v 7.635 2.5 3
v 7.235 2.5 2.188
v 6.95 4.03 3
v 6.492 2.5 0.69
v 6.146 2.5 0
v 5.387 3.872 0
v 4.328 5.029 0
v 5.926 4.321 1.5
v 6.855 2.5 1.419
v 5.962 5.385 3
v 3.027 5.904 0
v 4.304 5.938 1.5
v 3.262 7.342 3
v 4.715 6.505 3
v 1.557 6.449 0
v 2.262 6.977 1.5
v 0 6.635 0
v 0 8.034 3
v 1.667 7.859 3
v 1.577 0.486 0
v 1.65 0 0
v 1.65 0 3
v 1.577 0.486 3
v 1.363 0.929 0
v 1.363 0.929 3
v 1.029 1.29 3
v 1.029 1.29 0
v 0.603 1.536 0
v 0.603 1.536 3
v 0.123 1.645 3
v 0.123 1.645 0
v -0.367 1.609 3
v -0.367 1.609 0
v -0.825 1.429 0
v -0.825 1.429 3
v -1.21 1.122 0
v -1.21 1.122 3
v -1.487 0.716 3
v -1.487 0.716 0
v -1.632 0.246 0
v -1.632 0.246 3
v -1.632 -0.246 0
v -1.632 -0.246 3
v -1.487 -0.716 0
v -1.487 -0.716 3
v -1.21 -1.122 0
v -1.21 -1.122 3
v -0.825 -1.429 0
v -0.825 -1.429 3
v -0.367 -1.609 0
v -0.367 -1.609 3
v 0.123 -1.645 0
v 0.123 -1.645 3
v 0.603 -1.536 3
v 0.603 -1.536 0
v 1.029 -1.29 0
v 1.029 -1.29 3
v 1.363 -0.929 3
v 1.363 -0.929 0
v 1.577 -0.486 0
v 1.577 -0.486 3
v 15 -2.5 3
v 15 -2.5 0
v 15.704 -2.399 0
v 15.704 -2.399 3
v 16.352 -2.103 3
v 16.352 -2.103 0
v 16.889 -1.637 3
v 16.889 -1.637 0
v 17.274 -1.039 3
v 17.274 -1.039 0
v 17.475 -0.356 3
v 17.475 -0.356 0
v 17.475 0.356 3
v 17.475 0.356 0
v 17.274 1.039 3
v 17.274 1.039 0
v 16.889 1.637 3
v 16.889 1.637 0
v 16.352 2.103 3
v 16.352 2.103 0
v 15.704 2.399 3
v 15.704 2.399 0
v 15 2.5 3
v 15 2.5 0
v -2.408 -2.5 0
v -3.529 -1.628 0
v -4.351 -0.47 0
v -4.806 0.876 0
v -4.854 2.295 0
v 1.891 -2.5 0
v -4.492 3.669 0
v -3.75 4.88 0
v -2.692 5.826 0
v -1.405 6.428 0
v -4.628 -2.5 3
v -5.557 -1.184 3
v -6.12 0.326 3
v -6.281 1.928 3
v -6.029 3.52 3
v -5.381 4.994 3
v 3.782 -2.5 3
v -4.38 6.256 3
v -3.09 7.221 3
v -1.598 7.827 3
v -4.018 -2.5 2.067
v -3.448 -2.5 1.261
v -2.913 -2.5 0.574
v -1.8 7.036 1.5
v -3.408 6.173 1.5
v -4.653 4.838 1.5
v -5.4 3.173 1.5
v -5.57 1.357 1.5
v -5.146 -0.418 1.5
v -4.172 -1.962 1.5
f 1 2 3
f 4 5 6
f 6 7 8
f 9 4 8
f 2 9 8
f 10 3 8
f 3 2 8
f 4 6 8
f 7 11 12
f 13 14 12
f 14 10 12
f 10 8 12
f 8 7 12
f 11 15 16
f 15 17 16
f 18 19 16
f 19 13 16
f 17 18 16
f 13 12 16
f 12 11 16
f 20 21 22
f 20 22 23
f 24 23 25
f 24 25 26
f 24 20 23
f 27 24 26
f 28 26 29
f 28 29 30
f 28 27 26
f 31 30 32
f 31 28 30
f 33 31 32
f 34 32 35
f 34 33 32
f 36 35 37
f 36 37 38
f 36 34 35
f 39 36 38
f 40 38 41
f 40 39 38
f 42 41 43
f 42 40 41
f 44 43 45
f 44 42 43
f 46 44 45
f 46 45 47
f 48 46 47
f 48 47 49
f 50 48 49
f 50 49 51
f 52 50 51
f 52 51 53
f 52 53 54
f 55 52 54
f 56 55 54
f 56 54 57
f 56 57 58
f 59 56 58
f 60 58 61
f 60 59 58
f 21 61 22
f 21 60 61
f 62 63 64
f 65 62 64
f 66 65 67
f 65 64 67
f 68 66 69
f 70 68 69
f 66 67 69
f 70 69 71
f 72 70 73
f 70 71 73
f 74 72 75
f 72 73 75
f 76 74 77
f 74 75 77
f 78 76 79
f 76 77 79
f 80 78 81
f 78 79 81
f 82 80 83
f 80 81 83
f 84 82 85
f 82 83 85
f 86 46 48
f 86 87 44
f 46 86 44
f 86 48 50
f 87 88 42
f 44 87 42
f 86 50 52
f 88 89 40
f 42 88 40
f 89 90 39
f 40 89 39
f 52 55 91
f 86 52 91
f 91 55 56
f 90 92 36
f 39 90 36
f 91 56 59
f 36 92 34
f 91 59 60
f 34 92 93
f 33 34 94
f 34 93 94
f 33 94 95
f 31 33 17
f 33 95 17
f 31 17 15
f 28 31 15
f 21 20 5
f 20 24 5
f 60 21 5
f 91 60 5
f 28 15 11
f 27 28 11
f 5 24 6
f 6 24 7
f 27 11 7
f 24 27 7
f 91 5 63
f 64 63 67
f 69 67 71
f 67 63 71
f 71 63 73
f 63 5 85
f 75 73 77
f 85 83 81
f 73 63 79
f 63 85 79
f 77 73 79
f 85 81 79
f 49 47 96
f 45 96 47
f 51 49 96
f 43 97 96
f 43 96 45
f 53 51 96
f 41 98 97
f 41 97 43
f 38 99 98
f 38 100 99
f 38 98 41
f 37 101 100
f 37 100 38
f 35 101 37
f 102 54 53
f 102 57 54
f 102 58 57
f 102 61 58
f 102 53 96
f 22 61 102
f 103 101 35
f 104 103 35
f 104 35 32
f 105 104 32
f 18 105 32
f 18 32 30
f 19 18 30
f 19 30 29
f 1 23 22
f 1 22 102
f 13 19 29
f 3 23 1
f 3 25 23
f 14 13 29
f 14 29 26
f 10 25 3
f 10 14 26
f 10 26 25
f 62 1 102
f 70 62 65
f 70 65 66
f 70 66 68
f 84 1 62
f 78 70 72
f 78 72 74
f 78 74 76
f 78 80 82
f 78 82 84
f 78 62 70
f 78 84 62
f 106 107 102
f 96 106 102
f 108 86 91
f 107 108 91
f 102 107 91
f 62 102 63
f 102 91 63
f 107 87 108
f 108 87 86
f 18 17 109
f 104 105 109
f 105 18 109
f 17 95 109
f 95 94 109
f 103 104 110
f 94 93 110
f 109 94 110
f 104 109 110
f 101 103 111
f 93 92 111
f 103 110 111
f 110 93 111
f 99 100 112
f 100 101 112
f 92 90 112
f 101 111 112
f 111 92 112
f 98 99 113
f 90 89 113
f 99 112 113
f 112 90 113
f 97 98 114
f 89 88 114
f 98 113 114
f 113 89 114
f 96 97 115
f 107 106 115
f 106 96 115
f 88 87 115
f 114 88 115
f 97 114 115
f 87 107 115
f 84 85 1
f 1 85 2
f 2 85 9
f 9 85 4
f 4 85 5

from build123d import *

# Parameters (mm, degrees)
ESBO_O2_R                = 1.65
RESSALTO_EXTRUS_O1_DEPTH = 3
CHANFRO1_SIZE            = 4
CHANFRO1_SIZE_2          = 1.865230633
ESBO_O3_W                = 16.82142479
ESBO_O3_H                = 3.834770965
CORTE_EXTRUS_O1_DEPTH    = 5


with BuildPart() as part:
    # Esboço2 → Ressalto-extrusão1 (new body)
    with BuildSketch(Plane.XY):
        with BuildLine():
            Line((15, 2.5), (8.124038405, 2.5))
            ThreePointArc((8.124038405, 2.5), (5.049752469, 6.837397166), (0, 8.5))
            ThreePointArc((0, 8.5), (-6.75, 1.75), (0, -5))
            ThreePointArc((0, -5), (2.5, -4.330127019), (4.330127019, -2.5))
            Line((4.330127019, -2.5), (15, -2.5))
            ThreePointArc((15, -2.5), (17.5, 0), (15, 2.5))
        make_face()
        Circle(ESBO_O2_R, mode=Mode.SUBTRACT)
    extrude(amount=RESSALTO_EXTRUS_O1_DEPTH)

    # Chanfro1
    # the kernel refuses this chamfer: 4, 1.865230633 mm, written as the material it takes off along each edge
    with BuildSketch(Plane(origin=(0, 0, 0), x_dir=(0.6049671971575049, -0.7962503942626293, 0), z_dir=(-0.7962503942626293, -0.6049671971575049, 0))) as chanfro1_piece_1_section:
        Polygon((8.5, CHANFRO1_SIZE), (8.5 - CHANFRO1_SIZE_2, 0), (8.5, 0), align=None)
    chanfro1_piece_1 = revolve(axis=Axis((0, 0, 0), (0, 0, 1)), revolution_arc=142.773518556, mode=Mode.PRIVATE)
    chanfro1_piece_1 = split(chanfro1_piece_1, bisect_by=Plane(origin=(6.168513844, 2.5, 1.415637253), z_dir=(0, 1, 0)), keep=Keep.TOP, mode=Mode.PRIVATE)
    add(chanfro1_piece_1, mode=Mode.SUBTRACT)
    with BuildSketch(Plane(origin=(0, 0, 0), x_dir=(0, -1, 0), z_dir=(-1, 0, 0))) as chanfro1_piece_2_section:
        Polygon((5, CHANFRO1_SIZE), (5 - CHANFRO1_SIZE_2, 0), (5, 0), align=None)
    chanfro1_piece_2 = revolve(axis=Axis((0, 0, 0), (0, 0, 1)), revolution_arc=178.782767485, mode=Mode.PRIVATE)
    chanfro1_piece_2 = split(chanfro1_piece_2, bisect_by=Plane(origin=(1.977914481, -2.5, 1.262439035), z_dir=(0, -1, 0)), keep=Keep.TOP, mode=Mode.PRIVATE)
    add(chanfro1_piece_2, mode=Mode.SUBTRACT)
    with BuildSketch(Plane(origin=(0, 1.75, 0), x_dir=(0, 1, 0), z_dir=(1, 0, 0))) as chanfro1_piece_3:
        Polygon((6.75, CHANFRO1_SIZE), (6.75 - CHANFRO1_SIZE_2, 0), (6.75, 0), align=None)
    revolve(axis=Axis((0, 1.75, 0), (0, 0, 1)), revolution_arc=180, mode=Mode.SUBTRACT)

    # Esboço3 → Corte-extrusão1 (cut)
    with BuildSketch(Plane.XY.offset(3)):
        with Locations((-0.707373788, -4.417385483)):
            Rectangle(ESBO_O3_W, ESBO_O3_H)
    extrude(amount=-CORTE_EXTRUS_O1_DEPTH, mode=Mode.SUBTRACT)


solid = part.part
